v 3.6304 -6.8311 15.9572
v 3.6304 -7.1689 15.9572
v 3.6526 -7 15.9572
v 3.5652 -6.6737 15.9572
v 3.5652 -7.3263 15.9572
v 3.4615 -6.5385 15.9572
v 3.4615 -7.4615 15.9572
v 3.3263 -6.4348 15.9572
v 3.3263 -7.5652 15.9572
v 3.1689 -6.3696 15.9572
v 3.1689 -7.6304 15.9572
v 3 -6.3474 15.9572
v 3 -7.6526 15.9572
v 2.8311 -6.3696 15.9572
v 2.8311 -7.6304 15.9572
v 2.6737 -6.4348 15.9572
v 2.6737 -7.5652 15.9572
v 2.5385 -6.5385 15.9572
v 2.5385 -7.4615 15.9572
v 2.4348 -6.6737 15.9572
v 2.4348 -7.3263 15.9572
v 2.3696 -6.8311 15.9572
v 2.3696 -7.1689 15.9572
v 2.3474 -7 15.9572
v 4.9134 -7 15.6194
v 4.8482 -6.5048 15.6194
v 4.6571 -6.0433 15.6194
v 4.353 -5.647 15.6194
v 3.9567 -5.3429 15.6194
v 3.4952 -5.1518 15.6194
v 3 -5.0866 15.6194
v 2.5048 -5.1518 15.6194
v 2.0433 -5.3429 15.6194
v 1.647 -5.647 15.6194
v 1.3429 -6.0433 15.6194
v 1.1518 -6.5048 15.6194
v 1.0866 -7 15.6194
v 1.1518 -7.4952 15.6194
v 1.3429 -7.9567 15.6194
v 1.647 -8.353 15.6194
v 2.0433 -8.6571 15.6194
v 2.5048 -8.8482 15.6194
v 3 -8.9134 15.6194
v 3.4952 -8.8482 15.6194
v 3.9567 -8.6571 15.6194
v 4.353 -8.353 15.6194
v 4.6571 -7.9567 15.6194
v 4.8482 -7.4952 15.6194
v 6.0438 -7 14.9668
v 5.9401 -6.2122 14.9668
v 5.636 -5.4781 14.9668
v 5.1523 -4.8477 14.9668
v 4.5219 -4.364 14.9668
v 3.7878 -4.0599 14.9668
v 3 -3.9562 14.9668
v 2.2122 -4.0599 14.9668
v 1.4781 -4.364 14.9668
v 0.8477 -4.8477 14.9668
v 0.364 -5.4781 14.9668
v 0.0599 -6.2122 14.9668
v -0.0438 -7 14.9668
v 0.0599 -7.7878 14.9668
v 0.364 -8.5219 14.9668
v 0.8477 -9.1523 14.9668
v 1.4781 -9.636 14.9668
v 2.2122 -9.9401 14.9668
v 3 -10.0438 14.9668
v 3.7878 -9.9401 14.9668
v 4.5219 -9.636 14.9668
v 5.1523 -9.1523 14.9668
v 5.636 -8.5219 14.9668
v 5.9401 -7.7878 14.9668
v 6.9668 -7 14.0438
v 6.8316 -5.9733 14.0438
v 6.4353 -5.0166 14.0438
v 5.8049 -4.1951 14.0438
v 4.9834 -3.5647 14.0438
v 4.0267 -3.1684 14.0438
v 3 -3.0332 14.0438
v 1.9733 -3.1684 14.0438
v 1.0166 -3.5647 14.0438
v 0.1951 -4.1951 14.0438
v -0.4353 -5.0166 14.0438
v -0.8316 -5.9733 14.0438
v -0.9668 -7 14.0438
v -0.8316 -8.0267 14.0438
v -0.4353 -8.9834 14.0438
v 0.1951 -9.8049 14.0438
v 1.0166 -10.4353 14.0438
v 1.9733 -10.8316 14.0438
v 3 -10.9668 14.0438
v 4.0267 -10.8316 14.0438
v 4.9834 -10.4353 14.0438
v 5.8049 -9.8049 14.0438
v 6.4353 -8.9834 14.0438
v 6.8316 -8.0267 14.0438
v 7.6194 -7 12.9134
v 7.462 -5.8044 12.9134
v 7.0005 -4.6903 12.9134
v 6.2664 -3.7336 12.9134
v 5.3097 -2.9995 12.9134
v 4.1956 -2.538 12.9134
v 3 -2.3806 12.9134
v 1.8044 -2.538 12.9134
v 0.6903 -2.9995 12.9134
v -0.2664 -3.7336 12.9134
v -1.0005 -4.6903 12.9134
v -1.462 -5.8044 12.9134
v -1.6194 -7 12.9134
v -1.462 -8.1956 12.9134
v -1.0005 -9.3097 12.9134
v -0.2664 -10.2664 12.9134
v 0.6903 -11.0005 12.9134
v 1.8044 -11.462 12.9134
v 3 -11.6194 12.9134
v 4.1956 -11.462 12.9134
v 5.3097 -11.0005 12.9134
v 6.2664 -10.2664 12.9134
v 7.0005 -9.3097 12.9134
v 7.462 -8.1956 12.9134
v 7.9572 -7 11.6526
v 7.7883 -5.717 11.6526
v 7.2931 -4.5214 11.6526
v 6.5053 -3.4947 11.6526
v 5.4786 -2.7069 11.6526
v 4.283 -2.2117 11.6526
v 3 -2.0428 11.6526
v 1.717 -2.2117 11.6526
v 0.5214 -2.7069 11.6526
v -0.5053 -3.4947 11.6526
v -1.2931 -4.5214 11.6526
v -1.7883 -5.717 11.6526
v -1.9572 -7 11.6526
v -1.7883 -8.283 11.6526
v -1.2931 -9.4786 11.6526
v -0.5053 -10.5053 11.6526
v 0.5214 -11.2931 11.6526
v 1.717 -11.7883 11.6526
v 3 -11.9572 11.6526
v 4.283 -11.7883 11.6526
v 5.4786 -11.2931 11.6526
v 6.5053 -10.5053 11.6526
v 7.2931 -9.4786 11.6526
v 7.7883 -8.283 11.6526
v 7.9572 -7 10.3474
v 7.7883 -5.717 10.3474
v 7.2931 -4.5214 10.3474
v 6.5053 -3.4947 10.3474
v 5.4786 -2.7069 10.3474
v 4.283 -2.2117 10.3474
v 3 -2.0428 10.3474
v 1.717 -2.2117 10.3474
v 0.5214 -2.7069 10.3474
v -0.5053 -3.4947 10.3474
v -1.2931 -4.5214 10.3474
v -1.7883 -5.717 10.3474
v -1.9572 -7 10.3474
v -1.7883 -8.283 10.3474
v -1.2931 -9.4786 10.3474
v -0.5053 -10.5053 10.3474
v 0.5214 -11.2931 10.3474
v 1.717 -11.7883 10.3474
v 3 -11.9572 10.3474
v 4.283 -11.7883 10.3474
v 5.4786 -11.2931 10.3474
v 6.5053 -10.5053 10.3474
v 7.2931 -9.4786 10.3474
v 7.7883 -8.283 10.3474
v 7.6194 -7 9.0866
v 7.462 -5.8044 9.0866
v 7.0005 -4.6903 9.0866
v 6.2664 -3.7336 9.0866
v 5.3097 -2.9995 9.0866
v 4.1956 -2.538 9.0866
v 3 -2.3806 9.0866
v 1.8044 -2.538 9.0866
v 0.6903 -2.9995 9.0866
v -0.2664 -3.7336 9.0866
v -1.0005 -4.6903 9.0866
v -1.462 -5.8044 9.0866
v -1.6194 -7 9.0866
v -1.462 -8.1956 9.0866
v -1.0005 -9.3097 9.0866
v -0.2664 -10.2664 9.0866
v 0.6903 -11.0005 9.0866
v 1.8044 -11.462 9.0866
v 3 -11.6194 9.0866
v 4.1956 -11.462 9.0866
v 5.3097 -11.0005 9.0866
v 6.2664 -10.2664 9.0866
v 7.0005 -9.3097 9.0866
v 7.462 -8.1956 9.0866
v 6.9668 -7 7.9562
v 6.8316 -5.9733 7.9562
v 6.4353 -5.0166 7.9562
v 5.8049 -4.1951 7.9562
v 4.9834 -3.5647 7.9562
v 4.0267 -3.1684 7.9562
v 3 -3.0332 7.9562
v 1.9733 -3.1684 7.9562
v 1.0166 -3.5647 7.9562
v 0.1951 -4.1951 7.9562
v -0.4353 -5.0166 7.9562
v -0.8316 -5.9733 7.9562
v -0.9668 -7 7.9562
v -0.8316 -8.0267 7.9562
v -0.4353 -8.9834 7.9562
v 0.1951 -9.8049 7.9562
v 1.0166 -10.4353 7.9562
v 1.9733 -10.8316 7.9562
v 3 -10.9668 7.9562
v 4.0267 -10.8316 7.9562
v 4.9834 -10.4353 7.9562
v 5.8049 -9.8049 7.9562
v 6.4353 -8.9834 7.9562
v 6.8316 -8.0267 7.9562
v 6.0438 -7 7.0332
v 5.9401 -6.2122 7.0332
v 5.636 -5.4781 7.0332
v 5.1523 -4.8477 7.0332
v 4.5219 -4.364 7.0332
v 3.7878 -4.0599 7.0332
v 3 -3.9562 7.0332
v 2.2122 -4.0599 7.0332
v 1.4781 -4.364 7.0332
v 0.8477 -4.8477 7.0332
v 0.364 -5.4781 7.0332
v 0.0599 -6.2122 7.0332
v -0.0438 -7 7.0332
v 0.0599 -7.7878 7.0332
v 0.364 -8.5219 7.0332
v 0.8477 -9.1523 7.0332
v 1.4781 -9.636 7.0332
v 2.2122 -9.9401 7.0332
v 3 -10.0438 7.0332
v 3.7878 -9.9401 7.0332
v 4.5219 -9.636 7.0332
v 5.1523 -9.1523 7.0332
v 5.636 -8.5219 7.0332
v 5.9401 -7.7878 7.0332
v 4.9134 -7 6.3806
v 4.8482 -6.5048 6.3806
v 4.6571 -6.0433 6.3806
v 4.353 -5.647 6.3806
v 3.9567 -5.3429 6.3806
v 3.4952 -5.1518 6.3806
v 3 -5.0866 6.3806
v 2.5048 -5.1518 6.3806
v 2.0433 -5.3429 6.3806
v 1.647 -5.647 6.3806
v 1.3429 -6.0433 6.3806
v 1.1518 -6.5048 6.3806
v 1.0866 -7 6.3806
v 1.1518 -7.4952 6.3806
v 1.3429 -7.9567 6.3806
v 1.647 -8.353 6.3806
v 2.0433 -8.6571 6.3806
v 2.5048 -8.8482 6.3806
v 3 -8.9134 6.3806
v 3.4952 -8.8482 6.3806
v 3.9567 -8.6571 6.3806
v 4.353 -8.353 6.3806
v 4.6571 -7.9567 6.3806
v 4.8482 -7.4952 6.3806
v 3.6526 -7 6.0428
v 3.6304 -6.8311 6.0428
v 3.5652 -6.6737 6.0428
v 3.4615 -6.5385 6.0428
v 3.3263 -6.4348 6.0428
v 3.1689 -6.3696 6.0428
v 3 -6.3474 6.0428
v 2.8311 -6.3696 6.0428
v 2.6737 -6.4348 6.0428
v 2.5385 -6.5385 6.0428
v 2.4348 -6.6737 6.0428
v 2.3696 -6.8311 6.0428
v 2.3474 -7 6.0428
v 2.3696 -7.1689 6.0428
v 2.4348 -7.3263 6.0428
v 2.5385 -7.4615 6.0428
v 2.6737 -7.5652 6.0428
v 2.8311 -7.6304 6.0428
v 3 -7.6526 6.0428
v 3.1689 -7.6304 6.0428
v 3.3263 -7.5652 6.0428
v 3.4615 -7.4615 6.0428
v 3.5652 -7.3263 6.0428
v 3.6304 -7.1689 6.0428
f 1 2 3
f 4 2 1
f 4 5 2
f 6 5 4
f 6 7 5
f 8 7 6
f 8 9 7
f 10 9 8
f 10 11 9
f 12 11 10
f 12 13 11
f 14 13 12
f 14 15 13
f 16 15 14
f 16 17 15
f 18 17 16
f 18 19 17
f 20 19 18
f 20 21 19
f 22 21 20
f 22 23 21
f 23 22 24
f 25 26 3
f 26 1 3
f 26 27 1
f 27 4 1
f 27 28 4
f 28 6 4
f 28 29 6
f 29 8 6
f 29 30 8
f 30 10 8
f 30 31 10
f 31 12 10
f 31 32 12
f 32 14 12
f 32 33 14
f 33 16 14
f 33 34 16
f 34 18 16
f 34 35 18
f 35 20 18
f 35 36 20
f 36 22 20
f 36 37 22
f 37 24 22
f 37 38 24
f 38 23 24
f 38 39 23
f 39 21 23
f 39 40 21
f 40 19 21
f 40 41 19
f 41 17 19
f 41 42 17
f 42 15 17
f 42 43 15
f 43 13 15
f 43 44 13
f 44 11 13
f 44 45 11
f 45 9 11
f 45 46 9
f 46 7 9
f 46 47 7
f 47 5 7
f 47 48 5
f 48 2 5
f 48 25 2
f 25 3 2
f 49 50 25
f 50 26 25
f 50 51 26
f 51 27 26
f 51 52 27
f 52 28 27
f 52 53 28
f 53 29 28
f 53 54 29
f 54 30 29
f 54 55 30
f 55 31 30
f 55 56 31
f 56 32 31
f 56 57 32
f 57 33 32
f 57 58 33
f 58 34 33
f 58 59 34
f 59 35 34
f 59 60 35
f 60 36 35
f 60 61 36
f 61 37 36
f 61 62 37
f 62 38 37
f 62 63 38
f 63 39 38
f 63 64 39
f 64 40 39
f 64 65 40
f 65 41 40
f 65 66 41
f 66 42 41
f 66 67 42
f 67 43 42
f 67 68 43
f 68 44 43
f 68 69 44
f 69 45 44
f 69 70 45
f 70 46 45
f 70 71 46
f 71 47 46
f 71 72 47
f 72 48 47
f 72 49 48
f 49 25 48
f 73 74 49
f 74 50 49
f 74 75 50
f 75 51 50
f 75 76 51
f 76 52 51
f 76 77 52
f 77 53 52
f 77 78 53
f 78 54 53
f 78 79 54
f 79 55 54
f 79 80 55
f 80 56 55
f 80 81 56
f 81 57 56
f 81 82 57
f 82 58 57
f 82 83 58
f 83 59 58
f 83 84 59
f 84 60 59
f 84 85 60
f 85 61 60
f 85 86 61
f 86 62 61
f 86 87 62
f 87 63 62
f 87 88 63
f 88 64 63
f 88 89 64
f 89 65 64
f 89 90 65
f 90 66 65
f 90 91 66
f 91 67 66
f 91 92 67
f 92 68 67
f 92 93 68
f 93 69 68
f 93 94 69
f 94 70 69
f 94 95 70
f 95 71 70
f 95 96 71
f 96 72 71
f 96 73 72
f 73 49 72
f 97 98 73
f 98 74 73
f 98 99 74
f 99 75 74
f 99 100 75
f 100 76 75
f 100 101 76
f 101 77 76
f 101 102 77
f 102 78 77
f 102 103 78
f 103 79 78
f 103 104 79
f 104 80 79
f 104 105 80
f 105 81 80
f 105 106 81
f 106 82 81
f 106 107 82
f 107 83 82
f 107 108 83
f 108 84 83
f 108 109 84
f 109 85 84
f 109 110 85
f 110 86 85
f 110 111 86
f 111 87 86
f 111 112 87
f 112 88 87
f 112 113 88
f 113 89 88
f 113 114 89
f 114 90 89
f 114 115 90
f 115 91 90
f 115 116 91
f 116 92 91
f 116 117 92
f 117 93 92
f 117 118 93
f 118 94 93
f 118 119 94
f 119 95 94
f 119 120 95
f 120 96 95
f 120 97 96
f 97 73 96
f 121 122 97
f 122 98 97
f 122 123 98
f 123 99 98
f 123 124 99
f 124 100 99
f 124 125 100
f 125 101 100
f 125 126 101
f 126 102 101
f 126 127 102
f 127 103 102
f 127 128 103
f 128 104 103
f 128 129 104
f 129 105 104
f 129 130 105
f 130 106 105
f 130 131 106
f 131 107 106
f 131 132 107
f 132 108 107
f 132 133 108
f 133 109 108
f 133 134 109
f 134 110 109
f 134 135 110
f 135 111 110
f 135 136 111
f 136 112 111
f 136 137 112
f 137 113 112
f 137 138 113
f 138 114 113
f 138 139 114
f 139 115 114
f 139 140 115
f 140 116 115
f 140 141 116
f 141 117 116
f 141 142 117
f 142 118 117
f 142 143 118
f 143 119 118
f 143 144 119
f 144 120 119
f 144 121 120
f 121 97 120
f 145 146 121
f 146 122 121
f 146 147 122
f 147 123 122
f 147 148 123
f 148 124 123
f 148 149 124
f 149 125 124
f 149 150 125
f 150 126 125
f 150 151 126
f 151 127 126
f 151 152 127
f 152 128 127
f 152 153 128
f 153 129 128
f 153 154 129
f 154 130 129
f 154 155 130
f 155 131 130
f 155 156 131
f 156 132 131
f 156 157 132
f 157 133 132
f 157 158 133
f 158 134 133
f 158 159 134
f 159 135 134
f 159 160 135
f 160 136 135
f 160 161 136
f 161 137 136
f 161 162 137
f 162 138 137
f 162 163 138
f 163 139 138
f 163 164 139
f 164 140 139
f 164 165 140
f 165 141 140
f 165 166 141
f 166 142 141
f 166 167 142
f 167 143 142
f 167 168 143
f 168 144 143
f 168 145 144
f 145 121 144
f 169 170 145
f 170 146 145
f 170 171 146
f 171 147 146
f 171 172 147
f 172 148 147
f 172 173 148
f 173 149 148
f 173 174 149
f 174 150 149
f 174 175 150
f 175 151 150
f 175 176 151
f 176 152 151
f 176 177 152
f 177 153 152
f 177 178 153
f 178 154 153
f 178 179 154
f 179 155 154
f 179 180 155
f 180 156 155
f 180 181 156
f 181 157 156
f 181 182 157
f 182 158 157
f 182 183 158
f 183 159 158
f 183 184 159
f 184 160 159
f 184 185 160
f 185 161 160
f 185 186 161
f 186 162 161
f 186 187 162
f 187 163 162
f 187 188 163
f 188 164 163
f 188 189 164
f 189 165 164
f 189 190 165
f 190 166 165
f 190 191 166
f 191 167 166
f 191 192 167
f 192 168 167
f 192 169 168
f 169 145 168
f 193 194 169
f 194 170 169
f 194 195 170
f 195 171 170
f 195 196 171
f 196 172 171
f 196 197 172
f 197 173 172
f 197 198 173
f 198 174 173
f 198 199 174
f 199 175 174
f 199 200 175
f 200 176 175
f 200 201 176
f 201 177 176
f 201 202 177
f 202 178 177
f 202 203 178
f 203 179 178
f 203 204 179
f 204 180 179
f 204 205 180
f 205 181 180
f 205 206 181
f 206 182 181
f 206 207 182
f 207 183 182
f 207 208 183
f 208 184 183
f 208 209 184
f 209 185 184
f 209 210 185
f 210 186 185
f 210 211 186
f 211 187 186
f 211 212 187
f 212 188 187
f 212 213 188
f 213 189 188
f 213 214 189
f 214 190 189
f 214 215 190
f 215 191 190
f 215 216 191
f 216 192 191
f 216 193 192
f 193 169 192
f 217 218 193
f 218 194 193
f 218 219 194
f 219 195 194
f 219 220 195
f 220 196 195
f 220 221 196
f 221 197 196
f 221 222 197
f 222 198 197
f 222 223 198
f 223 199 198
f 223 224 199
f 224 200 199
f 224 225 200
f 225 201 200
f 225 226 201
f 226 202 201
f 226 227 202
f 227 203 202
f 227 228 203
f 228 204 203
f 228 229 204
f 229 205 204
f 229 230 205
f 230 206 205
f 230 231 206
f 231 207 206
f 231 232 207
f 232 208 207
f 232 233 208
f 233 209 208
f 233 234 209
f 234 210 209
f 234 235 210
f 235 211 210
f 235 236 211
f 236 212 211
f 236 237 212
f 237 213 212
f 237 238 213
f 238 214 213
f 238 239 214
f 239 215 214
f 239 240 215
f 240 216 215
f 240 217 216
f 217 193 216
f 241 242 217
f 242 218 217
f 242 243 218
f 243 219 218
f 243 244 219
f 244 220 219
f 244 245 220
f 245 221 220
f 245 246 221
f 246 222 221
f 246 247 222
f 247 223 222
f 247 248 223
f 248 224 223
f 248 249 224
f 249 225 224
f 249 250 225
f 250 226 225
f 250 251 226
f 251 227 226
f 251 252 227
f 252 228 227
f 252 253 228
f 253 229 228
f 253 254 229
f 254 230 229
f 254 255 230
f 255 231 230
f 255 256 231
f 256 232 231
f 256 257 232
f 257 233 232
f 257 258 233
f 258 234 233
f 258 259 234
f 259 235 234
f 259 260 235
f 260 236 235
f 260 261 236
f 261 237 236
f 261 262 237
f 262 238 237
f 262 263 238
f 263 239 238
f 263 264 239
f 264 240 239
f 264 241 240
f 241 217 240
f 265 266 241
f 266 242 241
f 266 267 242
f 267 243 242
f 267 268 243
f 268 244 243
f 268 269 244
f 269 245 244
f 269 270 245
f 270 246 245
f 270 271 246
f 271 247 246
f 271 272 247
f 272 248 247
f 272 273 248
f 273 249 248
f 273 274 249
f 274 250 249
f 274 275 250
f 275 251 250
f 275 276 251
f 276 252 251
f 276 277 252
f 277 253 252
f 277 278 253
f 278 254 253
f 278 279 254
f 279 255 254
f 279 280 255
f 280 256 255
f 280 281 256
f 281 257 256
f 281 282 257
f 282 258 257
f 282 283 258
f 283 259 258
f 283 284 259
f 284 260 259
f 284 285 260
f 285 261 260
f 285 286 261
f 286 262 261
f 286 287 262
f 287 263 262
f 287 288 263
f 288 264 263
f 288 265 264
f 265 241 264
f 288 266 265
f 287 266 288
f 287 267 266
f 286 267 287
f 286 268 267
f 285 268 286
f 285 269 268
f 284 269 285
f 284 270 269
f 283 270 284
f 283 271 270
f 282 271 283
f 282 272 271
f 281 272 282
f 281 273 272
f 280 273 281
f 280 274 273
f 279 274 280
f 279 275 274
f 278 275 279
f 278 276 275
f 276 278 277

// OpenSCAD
// A sphere is closed at its poles, and the poles come from the declaration.
//
// Sibling of step-sphere, which is the same shape at the origin with the
// default ring count. This one differs on every axis that could be hiding an
// assumption:
//
//   - it is **off the origin**, so a pole taken as (0, 0, +/-r) instead of as
//     centre + r*axis lands 13 mm away and the seam is not on the sphere;
//   - it has **$fn = 24**, so num_rings = 12 rather than 16 - eleven bands to
//     merge, not fifteen - and the outermost ring sits at 180/24 = 7.5 degrees
//     off the axis rather than 5.625;
//   - its **radius is 5**, so a pole distance carried over from the other
//     fixture's r = 10 is off by a factor of two.
//
// None of those change the answer, which is the point: the exported solid is
// the sphere the model declared, whatever the tessellation did.
//
// EXPECT: 7 analytic surfaces available (6 cylindrical, 1 spherical, 0 toroidal, 0 Bezier)
// EXPECT: 1 surface recognised (0 toroidal, 1 spherical, 0 conical, 0 partial), 266 facets replaced
//
// num_rings is (num_fragments + 1) / 2 = 12, so the rings sit at
// phi = 180(i + 0.5)/12 and their radii pair up about the equator: 6 distinct
// circles, declared as cylinders, plus the sphere itself is 7 records. 266
// facets is 11 bands of 24 quads, which is 264, plus the two polar caps - they
// are replaced by this face too, which is the whole point of the fixture.
//
// One face and nothing else. A sphere closed on itself has no rim to bound it
// and no cap to close it: it is bounded by its seam meridian alone, used once
// in either direction, and the poles are where the two usages meet. OCCT
// inserts the zero length edge at either pole itself, which is what the two
// degenerate edges are.
// ROUNDTRIP: Sphere=1
// EDGES: Circle=1 degenerate=2
// RADII: Sphere=5
//
// The approximation flag changes nothing here either: all 266 facets are
// covered by the analytic pass, so nothing is left uncovered to fit.
// ROUNDTRIP-APPROX: Sphere=1
// EDGES-APPROX: Circle=1 degenerate=2
// VOLUME-APPROX: 523.5987756
//
// (4/3)*pi*r^3 at r = 5, exactly, and derived from nothing but that. The
// tessellation does not appear in it: this is the assertion that the export is
// the declared sphere rather than the mesh's inscribed polyhedron with its
// poles sliced off, and the two differ by 0.0035% - small, and not noise.
// VOLUME: 523.5987756
//
// Every EXPORT-WARNING this fixture raises, named, each with why it is known;
// any other fails the test, and so does a named one no run raises any more.
//
// One declared surface written partly by one recogniser and partly by
// another, the division decided by pass order - the split surface of open
// item 26, which R0 (item 29) has not reached here.
// KNOWN-EXPORT-WARNING: split between different kinds of recogniser
// KNOWN-EXPORT-WARNING: so this is one connected region cut in two by pass order
//
// Corners the file does not write: the export writes one closed face here,
// and every corner it does write is on its surface at about 1e-15
// (scripts/step-corner-stray.py). The arbiter counts corners of faces that
// are not written, against the wrong surface - open item 43, W1.
// KNOWN-EXPORT-WARNING: left off a surface the file writes a face of them on
$fn = 24;
translate([3, -7, 11]) sphere(r = 5);
